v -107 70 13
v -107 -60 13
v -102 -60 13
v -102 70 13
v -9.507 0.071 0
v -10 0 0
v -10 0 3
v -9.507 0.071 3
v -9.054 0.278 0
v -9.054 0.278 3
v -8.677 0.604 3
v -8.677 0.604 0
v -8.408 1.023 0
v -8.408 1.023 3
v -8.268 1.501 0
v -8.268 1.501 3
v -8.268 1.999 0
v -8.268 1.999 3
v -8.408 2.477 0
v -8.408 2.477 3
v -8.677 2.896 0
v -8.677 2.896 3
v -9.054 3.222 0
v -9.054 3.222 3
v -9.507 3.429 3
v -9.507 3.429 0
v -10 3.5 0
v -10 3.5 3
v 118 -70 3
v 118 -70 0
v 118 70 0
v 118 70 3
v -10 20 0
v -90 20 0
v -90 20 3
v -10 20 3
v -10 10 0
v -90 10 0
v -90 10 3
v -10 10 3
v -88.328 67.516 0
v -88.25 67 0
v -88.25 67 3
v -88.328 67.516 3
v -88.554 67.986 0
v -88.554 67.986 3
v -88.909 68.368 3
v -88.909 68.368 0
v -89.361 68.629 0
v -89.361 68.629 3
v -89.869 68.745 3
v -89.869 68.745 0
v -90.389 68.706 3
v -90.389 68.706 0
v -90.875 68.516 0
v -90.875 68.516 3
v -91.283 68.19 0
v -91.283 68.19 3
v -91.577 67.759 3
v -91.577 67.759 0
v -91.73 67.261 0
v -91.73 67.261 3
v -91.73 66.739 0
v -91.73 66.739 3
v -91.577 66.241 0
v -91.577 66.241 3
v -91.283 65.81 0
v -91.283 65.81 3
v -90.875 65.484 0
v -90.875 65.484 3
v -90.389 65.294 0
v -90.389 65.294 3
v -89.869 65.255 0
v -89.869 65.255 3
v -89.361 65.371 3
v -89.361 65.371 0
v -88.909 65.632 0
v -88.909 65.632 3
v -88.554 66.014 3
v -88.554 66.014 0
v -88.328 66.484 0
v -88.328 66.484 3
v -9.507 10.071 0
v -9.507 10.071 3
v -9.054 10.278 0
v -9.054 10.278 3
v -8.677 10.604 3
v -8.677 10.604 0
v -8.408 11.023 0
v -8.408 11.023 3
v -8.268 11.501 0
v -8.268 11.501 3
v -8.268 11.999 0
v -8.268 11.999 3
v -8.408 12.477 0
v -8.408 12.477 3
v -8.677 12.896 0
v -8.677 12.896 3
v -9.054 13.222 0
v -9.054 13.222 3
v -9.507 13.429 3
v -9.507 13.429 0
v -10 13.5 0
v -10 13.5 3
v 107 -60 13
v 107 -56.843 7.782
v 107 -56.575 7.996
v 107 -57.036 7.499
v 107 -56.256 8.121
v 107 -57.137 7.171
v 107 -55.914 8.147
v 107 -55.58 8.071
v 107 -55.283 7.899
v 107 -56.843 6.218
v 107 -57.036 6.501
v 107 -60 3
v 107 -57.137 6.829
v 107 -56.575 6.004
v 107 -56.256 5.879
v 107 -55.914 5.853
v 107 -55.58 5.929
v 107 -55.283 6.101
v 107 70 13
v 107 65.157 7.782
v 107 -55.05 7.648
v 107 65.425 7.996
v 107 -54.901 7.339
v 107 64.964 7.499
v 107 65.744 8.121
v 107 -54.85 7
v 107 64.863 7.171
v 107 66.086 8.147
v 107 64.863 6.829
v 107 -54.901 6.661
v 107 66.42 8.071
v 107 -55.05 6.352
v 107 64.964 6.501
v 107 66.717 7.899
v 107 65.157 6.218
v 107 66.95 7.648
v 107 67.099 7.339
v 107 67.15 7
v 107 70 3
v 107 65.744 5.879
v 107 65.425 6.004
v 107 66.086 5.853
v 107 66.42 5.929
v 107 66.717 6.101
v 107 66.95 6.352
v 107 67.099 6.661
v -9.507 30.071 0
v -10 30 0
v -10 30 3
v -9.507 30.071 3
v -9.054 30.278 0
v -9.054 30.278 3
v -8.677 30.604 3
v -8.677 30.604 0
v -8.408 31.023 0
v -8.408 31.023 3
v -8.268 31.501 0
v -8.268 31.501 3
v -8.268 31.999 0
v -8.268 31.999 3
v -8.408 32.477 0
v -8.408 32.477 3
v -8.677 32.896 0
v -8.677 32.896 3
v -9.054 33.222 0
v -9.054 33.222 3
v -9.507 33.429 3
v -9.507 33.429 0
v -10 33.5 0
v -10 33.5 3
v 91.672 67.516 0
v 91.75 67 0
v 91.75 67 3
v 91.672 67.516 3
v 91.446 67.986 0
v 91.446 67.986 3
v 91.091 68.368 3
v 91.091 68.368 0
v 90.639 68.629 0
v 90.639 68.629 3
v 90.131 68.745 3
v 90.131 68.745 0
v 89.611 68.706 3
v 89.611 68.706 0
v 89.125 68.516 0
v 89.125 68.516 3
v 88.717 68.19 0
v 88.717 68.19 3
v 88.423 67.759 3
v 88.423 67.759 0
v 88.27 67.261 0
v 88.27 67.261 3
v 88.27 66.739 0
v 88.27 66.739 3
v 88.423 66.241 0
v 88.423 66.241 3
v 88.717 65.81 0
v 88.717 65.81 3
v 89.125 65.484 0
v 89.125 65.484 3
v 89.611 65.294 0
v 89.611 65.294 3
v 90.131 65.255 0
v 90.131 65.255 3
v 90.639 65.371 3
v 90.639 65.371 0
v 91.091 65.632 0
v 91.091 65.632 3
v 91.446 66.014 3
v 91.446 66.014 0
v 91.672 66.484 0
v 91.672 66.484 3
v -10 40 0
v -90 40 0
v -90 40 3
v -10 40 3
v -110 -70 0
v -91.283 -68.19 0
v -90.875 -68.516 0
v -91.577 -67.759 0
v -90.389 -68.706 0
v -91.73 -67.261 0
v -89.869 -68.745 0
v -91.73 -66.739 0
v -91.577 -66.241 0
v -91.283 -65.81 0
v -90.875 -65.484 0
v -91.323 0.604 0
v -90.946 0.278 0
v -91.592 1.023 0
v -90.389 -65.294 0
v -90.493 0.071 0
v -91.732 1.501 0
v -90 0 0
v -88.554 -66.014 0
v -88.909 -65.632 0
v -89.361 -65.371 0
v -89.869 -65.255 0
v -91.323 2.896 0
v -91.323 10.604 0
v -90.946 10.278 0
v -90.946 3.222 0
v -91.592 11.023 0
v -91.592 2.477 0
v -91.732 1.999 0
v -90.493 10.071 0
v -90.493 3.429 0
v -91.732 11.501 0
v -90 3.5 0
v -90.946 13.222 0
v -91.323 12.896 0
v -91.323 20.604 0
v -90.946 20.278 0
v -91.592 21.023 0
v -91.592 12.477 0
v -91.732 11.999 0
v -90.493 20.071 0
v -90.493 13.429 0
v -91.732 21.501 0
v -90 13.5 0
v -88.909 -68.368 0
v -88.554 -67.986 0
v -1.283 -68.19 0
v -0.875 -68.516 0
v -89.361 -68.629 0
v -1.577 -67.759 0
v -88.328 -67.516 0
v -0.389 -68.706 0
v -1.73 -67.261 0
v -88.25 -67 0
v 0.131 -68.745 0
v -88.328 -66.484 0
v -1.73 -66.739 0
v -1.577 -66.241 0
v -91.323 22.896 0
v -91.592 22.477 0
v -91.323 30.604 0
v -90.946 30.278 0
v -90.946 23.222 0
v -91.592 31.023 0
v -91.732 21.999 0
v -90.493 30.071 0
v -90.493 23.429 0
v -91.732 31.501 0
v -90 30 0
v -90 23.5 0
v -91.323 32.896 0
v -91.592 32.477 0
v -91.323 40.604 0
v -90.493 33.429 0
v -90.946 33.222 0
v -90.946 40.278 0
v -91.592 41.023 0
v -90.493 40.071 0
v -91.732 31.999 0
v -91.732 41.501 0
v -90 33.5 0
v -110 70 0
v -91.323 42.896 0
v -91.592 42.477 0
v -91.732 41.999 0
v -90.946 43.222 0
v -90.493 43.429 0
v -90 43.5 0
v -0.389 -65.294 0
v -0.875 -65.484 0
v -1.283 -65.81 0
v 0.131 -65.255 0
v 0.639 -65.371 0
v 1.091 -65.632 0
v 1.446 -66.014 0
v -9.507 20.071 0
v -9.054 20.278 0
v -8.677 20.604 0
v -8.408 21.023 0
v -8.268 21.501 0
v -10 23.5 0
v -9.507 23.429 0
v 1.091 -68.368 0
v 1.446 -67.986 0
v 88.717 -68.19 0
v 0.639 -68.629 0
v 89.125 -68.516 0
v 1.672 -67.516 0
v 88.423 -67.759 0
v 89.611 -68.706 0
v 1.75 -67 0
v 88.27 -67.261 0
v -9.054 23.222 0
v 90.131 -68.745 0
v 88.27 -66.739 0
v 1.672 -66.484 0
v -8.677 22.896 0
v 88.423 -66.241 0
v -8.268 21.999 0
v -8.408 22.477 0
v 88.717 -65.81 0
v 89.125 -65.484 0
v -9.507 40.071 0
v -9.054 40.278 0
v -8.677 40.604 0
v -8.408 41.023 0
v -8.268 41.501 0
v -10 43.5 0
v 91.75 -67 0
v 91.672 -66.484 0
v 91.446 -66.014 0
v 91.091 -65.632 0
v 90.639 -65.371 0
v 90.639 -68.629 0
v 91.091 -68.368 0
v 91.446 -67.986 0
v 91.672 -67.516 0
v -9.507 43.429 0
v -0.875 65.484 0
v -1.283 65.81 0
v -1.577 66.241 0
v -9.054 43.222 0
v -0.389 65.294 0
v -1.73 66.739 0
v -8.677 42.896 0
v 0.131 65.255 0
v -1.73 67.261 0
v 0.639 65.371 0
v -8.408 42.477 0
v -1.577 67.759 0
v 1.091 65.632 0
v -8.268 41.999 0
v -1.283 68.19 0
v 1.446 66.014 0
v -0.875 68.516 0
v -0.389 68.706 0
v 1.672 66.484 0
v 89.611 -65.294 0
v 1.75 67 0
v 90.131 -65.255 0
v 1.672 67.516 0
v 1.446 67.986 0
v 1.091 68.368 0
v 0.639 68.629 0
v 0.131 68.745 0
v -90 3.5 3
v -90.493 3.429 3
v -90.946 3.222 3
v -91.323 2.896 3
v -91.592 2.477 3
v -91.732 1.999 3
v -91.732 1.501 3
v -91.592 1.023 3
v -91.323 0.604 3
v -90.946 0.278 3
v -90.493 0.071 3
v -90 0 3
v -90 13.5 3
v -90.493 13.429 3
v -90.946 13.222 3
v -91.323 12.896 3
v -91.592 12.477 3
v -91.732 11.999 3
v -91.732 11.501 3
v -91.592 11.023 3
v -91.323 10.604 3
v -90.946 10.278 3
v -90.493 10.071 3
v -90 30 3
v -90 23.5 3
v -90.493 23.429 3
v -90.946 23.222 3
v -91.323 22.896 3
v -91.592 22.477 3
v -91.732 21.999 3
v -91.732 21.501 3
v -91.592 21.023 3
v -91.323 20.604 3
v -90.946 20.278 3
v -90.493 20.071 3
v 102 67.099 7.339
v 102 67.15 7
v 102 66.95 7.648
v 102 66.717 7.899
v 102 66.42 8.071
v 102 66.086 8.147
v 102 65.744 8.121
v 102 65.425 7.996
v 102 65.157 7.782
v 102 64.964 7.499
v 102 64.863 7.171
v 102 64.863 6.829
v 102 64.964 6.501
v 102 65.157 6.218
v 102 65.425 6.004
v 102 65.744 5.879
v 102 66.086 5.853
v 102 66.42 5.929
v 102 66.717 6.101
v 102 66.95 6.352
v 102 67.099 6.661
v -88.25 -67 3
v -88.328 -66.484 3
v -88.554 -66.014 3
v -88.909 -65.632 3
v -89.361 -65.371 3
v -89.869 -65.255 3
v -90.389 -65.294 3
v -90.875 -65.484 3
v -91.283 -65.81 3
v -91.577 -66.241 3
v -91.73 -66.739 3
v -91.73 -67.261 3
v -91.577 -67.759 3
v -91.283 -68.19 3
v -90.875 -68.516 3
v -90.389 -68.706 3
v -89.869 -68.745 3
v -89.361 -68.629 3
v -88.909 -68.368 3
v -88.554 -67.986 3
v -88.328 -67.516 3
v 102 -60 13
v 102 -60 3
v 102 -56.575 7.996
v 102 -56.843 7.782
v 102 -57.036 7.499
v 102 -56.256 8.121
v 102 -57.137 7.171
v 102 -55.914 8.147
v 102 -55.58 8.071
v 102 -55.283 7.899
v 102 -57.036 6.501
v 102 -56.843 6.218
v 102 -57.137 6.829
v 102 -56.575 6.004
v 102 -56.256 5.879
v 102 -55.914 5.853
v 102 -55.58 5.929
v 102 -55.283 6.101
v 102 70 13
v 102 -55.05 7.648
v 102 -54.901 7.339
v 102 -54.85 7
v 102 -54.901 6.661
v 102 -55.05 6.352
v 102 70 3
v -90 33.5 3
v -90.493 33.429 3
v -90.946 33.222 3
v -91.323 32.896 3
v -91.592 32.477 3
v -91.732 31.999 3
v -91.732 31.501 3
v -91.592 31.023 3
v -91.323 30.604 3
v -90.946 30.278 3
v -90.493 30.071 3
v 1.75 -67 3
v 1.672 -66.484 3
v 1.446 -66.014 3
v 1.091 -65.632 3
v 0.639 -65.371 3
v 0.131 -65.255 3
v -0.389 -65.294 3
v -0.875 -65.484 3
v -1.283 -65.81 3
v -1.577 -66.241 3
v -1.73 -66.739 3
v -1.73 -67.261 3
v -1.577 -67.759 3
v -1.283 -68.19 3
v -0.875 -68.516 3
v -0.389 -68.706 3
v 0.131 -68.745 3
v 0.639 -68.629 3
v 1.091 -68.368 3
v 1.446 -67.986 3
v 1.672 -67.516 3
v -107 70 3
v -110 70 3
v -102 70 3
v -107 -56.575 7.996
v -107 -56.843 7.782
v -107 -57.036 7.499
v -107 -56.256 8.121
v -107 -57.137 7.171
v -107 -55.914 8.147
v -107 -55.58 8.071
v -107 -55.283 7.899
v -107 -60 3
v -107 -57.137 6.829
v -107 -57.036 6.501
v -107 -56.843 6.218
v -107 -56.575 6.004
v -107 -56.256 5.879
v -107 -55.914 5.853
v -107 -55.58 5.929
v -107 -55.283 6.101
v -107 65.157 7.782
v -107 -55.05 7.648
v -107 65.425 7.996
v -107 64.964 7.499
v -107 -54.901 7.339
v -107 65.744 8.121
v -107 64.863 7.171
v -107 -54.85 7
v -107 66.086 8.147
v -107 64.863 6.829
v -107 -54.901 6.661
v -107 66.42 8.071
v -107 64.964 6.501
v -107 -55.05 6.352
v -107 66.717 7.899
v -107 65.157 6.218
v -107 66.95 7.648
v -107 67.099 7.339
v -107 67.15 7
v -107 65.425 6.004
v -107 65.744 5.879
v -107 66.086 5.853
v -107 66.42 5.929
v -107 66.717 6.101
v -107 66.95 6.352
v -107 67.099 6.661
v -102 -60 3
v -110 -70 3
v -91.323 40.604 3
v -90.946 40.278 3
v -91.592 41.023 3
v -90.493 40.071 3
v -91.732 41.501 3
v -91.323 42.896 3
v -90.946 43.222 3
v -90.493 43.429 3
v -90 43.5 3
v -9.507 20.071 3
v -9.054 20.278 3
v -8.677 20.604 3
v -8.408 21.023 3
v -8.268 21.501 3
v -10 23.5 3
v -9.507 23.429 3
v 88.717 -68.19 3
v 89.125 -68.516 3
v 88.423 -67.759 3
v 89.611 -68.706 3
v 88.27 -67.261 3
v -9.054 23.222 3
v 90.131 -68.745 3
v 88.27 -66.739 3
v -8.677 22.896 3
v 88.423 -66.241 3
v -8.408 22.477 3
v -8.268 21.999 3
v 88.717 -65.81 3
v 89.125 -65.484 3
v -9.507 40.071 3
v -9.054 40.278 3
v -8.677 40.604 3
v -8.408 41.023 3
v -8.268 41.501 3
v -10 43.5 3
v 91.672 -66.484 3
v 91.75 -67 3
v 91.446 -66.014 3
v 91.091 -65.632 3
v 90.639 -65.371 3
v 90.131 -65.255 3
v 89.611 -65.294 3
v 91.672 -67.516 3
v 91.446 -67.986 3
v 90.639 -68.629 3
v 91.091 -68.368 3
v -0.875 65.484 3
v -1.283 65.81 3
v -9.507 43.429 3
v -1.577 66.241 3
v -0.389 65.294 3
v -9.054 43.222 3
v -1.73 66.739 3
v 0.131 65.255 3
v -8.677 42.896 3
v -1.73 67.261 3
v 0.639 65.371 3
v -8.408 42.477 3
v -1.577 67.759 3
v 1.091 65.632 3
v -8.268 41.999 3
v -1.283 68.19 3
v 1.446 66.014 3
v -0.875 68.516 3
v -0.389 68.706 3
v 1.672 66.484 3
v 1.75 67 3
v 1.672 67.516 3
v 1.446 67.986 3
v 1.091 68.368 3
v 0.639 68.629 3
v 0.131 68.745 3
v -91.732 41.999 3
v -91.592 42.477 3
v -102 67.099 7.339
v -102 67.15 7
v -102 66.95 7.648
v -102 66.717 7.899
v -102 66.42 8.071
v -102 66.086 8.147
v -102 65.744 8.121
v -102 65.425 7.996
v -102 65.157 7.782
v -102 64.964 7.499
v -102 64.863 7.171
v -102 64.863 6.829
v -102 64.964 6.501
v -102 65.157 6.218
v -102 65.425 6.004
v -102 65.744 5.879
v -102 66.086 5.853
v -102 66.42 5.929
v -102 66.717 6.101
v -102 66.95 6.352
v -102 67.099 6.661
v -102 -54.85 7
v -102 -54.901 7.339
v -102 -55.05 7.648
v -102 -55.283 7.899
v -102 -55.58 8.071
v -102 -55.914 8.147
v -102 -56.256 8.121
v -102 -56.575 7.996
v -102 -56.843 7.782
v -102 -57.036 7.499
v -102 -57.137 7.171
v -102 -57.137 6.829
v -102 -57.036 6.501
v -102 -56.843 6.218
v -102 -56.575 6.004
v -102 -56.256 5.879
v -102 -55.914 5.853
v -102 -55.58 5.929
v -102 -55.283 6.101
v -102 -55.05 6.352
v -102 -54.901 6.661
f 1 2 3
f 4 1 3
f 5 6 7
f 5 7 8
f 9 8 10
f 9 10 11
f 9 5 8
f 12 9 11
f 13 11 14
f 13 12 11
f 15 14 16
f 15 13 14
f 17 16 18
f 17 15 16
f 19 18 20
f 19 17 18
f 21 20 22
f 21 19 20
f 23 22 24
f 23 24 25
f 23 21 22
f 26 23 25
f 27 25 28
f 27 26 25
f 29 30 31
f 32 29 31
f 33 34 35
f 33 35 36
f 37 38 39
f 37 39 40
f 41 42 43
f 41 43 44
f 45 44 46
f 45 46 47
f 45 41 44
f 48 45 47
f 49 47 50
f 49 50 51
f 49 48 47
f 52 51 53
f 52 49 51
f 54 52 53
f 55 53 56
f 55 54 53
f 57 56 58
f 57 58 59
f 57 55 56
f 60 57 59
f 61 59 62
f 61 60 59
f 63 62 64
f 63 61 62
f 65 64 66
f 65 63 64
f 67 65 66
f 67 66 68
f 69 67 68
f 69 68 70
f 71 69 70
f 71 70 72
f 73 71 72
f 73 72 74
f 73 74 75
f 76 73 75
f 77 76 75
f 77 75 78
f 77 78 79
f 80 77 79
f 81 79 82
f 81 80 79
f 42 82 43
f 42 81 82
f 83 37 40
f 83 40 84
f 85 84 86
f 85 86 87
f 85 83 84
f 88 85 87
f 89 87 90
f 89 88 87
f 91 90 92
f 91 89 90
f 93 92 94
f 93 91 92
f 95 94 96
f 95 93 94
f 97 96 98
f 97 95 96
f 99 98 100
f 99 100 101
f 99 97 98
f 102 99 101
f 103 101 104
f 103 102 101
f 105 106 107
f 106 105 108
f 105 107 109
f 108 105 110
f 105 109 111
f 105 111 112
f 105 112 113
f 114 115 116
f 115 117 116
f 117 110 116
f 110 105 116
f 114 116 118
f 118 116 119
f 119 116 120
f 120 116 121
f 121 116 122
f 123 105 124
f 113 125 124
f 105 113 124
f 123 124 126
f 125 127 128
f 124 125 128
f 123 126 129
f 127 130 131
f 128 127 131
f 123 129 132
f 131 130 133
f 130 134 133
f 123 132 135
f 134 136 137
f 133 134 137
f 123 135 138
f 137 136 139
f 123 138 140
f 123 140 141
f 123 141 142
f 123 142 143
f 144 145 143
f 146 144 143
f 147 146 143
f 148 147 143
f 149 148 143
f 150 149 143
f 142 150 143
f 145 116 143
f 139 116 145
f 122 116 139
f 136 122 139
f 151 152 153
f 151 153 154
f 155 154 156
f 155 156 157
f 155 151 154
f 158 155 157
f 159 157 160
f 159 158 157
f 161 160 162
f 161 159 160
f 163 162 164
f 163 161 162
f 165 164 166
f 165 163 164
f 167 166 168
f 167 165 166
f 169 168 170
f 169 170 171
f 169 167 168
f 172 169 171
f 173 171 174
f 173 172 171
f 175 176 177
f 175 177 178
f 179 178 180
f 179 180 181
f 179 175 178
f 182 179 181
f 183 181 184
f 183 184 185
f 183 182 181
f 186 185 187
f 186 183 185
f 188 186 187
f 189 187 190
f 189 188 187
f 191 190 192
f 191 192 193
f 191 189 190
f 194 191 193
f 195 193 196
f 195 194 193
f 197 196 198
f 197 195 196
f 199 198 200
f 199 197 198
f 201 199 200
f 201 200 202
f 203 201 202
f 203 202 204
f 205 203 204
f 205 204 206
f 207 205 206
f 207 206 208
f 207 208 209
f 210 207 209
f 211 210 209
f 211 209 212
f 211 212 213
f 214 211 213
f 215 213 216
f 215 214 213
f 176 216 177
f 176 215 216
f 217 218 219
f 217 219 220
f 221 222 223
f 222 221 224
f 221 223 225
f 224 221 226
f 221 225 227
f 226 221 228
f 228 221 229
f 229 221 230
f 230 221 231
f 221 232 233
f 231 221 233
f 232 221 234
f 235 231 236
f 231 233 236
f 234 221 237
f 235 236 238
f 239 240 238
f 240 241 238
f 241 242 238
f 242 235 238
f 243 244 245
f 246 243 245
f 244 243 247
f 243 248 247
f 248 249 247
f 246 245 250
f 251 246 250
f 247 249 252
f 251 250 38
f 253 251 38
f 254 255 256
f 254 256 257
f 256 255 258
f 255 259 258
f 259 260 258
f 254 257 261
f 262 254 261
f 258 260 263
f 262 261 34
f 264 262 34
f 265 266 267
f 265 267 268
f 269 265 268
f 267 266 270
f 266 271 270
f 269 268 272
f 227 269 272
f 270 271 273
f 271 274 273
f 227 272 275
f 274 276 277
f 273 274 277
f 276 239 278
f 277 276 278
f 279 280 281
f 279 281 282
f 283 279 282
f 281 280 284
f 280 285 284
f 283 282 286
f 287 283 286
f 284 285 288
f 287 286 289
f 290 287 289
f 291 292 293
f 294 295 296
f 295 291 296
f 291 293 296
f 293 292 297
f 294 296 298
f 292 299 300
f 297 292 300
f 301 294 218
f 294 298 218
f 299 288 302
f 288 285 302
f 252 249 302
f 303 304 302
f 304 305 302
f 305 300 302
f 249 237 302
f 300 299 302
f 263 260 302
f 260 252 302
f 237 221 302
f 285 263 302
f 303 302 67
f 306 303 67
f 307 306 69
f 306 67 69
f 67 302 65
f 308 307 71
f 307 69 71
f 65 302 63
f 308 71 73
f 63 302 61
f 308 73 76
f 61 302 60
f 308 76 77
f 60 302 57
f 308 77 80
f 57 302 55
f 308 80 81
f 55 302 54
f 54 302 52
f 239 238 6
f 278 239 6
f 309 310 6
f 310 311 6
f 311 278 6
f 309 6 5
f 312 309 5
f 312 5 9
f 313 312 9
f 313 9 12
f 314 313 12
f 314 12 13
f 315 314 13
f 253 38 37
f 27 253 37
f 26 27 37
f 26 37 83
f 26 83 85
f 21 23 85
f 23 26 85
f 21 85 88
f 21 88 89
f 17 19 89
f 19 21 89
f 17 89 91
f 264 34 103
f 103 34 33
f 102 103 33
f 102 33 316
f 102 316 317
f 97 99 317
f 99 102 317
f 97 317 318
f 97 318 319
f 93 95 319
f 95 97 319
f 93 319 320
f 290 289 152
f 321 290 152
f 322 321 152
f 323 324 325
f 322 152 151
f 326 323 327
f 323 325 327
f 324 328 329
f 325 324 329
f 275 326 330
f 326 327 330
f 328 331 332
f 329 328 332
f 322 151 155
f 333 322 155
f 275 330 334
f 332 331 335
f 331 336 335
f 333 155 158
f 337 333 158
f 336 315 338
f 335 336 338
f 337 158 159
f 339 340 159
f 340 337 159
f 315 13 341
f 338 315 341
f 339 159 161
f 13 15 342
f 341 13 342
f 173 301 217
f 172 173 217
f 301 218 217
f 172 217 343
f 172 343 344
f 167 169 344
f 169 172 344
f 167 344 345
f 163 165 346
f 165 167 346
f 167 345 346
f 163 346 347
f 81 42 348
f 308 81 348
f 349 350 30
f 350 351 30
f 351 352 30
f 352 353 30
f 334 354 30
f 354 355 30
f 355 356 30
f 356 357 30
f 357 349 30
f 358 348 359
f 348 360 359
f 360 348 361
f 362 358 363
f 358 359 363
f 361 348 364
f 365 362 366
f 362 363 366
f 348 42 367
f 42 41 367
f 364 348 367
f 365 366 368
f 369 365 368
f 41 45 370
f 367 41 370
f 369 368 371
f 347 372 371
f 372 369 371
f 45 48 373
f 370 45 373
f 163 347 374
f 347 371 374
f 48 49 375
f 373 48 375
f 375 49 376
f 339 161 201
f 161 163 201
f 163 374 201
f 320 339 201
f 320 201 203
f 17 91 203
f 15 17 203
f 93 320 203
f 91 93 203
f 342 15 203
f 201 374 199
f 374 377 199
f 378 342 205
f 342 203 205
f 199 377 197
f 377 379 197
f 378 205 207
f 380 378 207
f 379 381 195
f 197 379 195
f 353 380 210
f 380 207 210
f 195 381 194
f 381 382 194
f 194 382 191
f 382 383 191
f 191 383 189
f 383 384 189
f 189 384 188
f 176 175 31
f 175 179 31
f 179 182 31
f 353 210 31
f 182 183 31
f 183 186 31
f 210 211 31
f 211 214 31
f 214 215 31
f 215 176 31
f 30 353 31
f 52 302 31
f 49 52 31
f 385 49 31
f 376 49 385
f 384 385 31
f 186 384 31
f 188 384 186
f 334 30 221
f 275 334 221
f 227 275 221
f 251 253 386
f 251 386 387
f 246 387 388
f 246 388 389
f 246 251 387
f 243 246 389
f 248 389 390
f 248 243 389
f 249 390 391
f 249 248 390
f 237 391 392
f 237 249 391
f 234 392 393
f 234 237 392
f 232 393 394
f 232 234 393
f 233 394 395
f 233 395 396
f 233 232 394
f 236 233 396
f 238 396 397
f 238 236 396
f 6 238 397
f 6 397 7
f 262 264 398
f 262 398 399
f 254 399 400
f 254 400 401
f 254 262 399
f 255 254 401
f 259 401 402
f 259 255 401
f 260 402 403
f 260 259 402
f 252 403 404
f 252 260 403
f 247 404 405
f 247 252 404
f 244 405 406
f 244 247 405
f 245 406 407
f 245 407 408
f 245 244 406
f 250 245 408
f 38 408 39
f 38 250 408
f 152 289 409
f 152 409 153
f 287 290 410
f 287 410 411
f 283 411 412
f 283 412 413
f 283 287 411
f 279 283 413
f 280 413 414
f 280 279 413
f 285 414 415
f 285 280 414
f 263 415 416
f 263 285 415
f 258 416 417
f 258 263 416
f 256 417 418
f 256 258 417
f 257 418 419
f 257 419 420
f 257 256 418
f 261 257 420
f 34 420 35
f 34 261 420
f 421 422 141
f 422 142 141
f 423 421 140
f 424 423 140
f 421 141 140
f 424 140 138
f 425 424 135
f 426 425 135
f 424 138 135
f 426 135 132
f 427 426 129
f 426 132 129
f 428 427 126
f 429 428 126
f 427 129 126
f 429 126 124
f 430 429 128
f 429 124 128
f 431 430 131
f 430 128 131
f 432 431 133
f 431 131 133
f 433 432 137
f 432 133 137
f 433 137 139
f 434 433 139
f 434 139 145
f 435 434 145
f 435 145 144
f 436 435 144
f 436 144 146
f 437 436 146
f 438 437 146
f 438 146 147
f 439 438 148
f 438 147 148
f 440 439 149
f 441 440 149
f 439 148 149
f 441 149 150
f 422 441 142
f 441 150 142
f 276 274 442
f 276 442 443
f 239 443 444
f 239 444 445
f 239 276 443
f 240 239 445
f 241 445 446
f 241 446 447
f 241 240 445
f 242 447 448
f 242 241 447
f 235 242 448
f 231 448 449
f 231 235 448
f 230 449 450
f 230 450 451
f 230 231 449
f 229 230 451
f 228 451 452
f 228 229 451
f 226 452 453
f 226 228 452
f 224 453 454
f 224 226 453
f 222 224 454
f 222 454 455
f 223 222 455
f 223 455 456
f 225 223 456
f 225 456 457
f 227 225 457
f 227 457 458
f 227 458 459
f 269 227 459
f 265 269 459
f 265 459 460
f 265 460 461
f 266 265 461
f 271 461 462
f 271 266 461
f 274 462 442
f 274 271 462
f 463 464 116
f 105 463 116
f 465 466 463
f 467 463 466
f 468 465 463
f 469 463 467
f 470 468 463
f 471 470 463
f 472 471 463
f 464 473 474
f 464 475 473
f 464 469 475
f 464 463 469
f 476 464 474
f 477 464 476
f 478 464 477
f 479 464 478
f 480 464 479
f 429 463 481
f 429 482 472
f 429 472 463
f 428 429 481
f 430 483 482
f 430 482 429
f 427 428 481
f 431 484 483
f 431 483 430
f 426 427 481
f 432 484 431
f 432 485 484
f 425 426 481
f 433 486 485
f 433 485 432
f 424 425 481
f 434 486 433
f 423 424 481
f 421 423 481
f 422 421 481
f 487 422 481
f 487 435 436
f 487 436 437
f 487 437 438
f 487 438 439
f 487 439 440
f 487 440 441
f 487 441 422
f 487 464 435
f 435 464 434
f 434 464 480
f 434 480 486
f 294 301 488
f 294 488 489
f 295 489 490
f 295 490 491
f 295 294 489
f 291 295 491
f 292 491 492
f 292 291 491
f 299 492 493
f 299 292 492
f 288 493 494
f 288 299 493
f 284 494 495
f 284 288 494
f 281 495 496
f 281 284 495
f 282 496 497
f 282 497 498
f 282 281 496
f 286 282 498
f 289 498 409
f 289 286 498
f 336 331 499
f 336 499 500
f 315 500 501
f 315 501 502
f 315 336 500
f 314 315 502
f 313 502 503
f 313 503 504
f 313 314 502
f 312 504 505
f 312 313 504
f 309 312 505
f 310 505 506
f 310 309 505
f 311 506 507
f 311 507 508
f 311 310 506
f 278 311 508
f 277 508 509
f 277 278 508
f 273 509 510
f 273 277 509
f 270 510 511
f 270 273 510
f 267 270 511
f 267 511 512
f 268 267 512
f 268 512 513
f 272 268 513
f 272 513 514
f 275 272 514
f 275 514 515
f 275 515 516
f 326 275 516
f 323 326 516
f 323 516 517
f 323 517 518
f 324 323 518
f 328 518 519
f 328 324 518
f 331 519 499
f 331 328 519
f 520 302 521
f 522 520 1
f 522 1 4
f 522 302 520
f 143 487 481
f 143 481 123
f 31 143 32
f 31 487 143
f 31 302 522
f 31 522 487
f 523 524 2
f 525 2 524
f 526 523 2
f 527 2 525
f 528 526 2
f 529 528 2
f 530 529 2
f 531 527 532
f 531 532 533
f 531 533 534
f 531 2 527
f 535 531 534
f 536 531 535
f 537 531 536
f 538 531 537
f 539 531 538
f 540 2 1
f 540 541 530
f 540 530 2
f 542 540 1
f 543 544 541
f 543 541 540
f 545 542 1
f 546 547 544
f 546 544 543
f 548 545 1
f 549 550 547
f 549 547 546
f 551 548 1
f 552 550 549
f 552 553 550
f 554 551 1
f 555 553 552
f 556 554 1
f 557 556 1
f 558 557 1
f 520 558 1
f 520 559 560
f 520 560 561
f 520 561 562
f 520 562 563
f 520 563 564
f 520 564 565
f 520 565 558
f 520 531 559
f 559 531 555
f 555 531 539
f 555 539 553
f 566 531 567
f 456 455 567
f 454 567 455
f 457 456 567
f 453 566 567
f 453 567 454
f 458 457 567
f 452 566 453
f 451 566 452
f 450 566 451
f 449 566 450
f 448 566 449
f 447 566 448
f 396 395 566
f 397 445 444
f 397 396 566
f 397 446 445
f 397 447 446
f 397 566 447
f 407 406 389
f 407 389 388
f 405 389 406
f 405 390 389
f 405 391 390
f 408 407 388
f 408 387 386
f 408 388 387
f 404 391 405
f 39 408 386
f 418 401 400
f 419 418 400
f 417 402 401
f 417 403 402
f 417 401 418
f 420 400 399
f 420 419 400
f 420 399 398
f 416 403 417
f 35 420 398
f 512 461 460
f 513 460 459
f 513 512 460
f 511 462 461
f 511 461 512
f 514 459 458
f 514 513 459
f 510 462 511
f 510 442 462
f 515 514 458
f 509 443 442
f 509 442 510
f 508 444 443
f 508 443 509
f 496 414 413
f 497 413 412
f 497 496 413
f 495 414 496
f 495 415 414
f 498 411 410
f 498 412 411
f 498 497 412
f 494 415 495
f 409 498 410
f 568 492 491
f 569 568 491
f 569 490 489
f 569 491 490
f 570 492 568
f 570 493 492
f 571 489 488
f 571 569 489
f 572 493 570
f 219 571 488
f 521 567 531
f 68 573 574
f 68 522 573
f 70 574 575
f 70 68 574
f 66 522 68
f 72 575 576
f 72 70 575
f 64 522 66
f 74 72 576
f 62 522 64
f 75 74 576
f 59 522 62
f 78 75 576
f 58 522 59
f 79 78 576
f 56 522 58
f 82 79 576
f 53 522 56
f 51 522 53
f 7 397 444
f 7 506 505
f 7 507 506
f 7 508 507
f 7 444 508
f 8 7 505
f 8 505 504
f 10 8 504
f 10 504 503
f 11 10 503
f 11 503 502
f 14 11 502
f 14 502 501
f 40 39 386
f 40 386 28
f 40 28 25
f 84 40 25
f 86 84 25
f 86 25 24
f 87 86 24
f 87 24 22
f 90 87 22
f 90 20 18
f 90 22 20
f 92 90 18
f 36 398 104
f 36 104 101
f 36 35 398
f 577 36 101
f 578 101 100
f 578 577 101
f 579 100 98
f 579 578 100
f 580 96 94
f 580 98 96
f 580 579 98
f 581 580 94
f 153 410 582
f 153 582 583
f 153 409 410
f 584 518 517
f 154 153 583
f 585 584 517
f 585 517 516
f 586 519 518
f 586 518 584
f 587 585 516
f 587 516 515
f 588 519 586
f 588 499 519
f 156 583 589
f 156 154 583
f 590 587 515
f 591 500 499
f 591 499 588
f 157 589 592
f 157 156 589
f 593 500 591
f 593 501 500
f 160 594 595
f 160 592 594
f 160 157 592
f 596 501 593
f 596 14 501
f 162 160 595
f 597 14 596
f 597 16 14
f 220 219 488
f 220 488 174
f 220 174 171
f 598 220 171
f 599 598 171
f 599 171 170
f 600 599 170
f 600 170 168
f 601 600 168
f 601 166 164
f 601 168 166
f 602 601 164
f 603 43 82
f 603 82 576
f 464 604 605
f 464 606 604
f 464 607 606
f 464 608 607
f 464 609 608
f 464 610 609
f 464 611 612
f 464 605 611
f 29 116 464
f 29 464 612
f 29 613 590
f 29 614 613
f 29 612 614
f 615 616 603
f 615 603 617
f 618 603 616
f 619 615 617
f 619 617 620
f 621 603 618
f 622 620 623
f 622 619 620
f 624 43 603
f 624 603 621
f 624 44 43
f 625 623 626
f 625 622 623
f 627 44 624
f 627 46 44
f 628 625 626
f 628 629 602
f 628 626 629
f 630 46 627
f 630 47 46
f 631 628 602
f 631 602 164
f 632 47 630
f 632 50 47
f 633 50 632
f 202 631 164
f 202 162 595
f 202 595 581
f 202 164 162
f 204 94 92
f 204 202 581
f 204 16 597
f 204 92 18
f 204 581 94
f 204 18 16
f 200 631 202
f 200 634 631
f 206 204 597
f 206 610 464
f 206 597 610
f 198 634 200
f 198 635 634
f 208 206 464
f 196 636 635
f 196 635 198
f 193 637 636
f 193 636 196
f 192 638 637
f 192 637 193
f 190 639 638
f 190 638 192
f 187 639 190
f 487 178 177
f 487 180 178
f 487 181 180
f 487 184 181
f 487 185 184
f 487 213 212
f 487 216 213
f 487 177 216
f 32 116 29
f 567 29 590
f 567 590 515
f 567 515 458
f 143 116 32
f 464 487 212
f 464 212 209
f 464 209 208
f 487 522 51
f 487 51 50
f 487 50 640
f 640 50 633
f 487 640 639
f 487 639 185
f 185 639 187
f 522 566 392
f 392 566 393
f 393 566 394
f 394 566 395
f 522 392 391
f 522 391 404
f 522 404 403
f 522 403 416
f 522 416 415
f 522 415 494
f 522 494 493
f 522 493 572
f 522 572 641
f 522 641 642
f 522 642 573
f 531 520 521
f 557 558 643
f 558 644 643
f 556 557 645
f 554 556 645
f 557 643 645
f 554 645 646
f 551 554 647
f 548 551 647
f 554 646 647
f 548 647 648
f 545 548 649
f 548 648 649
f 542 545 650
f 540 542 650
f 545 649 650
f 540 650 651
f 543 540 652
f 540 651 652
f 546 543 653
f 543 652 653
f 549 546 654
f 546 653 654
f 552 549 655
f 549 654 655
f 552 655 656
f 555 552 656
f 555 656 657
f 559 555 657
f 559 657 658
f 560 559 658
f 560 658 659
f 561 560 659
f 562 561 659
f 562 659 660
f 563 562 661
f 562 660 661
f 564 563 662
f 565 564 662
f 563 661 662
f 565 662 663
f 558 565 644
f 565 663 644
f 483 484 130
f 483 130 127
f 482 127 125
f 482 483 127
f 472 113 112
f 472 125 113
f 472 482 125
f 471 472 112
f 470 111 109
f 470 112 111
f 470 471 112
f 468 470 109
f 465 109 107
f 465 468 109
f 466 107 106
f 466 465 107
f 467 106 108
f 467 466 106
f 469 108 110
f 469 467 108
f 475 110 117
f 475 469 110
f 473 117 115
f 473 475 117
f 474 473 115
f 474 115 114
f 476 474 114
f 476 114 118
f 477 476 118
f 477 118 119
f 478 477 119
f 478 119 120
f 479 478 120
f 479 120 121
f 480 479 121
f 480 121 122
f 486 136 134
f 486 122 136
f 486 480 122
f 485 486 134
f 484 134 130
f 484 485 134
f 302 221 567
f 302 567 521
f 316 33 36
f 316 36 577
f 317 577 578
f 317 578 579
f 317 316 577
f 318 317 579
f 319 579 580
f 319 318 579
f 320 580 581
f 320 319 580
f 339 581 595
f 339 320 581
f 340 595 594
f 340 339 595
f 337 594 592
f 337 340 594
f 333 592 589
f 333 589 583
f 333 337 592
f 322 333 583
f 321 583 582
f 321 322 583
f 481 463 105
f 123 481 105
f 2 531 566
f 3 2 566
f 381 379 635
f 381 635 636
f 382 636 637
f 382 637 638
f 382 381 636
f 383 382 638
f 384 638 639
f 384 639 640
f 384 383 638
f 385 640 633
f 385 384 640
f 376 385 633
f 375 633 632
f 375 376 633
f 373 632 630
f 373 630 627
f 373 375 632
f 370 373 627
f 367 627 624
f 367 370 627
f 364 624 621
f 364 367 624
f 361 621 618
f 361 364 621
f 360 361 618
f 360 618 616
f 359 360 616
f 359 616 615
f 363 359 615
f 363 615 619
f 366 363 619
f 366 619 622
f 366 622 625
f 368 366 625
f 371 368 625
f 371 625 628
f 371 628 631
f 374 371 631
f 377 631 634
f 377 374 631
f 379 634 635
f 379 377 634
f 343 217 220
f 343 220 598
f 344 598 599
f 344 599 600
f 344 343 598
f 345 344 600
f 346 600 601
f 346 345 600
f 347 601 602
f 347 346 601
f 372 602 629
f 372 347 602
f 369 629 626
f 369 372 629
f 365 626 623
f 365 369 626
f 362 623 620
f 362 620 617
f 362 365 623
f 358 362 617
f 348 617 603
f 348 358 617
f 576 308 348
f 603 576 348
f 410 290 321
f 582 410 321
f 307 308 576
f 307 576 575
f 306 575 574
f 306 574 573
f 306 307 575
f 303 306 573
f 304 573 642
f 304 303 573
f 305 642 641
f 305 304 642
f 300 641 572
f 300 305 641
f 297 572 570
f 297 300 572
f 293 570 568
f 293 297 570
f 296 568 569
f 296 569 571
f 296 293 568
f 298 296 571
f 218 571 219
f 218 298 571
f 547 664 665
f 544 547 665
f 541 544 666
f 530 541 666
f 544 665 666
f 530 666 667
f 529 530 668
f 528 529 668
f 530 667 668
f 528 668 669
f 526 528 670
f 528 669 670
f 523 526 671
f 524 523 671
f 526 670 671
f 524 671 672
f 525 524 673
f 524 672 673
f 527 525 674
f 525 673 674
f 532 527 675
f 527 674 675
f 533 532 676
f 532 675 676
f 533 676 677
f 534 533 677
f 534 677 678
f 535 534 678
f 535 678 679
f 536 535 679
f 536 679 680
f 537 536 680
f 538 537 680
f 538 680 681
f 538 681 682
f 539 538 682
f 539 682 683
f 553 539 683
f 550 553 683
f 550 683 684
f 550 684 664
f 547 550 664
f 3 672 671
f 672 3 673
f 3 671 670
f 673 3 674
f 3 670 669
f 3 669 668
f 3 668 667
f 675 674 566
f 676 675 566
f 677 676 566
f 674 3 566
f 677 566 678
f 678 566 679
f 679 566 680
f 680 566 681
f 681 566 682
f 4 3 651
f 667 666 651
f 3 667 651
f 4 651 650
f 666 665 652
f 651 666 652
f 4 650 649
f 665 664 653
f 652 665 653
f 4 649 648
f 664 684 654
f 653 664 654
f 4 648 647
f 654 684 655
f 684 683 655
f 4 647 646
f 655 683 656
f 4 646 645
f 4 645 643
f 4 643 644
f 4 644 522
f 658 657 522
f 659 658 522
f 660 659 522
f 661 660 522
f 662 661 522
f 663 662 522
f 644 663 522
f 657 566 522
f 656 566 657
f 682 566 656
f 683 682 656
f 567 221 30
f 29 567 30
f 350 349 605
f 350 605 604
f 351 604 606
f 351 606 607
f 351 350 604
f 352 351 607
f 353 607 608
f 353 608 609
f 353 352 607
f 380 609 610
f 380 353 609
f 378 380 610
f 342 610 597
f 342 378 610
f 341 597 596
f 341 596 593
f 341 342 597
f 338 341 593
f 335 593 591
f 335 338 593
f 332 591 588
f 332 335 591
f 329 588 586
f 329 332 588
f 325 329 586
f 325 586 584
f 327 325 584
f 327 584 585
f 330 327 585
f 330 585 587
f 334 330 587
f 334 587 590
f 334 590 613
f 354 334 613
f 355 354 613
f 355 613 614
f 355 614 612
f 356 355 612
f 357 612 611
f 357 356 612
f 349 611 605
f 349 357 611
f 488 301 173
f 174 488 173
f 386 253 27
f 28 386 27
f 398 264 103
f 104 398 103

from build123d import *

# Parameters (mm, degrees)
SKETCH_W     = 228
SKETCH_H     = 140
SKETCH_R     = 1.75
PAD_DEPTH    = 3
SKETCH001_W  = 5
SKETCH001_H  = 130
PAD001_DEPTH = 13
SKETCH002_R  = 1.15
POCKET_DEPTH = 112.5


with BuildPart() as part:
    # Sketch → Pad (new body)
    with BuildSketch(Plane.XY):
        with Locations((4, 0)):
            Rectangle(SKETCH_W, SKETCH_H)
        with Locations((-90, 67)):
            Circle(SKETCH_R, mode=Mode.SUBTRACT)
        with Locations((0, 67)):
            Circle(SKETCH_R, mode=Mode.SUBTRACT)
        with Locations((90, 67)):
            Circle(SKETCH_R, mode=Mode.SUBTRACT)
        with Locations((-90, -67)):
            Circle(SKETCH_R, mode=Mode.SUBTRACT)
        with Locations((0, -67)):
            Circle(SKETCH_R, mode=Mode.SUBTRACT)
        with Locations((90, -67)):
            Circle(SKETCH_R, mode=Mode.SUBTRACT)
        with BuildLine():
            ThreePointArc((-90, 43.5), (-91.75, 41.75), (-90, 40))
            Line((-90, 40), (-10, 40))
            ThreePointArc((-10, 40), (-8.25, 41.75), (-10, 43.5))
            Line((-90, 43.5), (-10, 43.5))
        make_face(mode=Mode.SUBTRACT)
        with BuildLine():
            ThreePointArc((-90, 33.5), (-91.75, 31.75), (-90, 30))
            Line((-90, 30), (-10, 30))
            ThreePointArc((-10, 30), (-8.25, 31.75), (-10, 33.5))
            Line((-90, 33.5), (-10, 33.5))
        make_face(mode=Mode.SUBTRACT)
        with BuildLine():
            ThreePointArc((-90, 23.5), (-91.75, 21.75), (-90, 20))
            Line((-90, 20), (-10, 20))
            ThreePointArc((-10, 20), (-8.25, 21.75), (-10, 23.5))
            Line((-90, 23.5), (-10, 23.5))
        make_face(mode=Mode.SUBTRACT)
        with BuildLine():
            ThreePointArc((-90, 13.5), (-91.75, 11.75), (-90, 10))
            Line((-90, 10), (-10, 10))
            ThreePointArc((-10, 10), (-8.25, 11.75), (-10, 13.5))
            Line((-90, 13.5), (-10, 13.5))
        make_face(mode=Mode.SUBTRACT)
        with BuildLine():
            ThreePointArc((-90, 3.5), (-91.75, 1.75), (-90, 0))
            Line((-90, 0), (-10, 0))
            ThreePointArc((-10, 0), (-8.25, 1.75), (-10, 3.5))
            Line((-90, 3.5), (-10, 3.5))
        make_face(mode=Mode.SUBTRACT)
    extrude(amount=PAD_DEPTH)

    # Sketch001 → Pad001 (join)
    with BuildSketch(Plane.XY):
        with Locations((104.5, 5)):
            Rectangle(SKETCH001_W, SKETCH001_H)
        with Locations((-104.5, 5)):
            Rectangle(SKETCH001_W, SKETCH001_H)
    extrude(amount=PAD001_DEPTH)

    # Sketch002 → Pocket (cut, symmetric)
    with BuildSketch(Plane.YZ):
        with Locations((-56, 7)):
            Circle(SKETCH002_R)
        with Locations((66, 7)):
            Circle(SKETCH002_R)
    extrude(amount=POCKET_DEPTH, both=True, mode=Mode.SUBTRACT)


solid = part.part
